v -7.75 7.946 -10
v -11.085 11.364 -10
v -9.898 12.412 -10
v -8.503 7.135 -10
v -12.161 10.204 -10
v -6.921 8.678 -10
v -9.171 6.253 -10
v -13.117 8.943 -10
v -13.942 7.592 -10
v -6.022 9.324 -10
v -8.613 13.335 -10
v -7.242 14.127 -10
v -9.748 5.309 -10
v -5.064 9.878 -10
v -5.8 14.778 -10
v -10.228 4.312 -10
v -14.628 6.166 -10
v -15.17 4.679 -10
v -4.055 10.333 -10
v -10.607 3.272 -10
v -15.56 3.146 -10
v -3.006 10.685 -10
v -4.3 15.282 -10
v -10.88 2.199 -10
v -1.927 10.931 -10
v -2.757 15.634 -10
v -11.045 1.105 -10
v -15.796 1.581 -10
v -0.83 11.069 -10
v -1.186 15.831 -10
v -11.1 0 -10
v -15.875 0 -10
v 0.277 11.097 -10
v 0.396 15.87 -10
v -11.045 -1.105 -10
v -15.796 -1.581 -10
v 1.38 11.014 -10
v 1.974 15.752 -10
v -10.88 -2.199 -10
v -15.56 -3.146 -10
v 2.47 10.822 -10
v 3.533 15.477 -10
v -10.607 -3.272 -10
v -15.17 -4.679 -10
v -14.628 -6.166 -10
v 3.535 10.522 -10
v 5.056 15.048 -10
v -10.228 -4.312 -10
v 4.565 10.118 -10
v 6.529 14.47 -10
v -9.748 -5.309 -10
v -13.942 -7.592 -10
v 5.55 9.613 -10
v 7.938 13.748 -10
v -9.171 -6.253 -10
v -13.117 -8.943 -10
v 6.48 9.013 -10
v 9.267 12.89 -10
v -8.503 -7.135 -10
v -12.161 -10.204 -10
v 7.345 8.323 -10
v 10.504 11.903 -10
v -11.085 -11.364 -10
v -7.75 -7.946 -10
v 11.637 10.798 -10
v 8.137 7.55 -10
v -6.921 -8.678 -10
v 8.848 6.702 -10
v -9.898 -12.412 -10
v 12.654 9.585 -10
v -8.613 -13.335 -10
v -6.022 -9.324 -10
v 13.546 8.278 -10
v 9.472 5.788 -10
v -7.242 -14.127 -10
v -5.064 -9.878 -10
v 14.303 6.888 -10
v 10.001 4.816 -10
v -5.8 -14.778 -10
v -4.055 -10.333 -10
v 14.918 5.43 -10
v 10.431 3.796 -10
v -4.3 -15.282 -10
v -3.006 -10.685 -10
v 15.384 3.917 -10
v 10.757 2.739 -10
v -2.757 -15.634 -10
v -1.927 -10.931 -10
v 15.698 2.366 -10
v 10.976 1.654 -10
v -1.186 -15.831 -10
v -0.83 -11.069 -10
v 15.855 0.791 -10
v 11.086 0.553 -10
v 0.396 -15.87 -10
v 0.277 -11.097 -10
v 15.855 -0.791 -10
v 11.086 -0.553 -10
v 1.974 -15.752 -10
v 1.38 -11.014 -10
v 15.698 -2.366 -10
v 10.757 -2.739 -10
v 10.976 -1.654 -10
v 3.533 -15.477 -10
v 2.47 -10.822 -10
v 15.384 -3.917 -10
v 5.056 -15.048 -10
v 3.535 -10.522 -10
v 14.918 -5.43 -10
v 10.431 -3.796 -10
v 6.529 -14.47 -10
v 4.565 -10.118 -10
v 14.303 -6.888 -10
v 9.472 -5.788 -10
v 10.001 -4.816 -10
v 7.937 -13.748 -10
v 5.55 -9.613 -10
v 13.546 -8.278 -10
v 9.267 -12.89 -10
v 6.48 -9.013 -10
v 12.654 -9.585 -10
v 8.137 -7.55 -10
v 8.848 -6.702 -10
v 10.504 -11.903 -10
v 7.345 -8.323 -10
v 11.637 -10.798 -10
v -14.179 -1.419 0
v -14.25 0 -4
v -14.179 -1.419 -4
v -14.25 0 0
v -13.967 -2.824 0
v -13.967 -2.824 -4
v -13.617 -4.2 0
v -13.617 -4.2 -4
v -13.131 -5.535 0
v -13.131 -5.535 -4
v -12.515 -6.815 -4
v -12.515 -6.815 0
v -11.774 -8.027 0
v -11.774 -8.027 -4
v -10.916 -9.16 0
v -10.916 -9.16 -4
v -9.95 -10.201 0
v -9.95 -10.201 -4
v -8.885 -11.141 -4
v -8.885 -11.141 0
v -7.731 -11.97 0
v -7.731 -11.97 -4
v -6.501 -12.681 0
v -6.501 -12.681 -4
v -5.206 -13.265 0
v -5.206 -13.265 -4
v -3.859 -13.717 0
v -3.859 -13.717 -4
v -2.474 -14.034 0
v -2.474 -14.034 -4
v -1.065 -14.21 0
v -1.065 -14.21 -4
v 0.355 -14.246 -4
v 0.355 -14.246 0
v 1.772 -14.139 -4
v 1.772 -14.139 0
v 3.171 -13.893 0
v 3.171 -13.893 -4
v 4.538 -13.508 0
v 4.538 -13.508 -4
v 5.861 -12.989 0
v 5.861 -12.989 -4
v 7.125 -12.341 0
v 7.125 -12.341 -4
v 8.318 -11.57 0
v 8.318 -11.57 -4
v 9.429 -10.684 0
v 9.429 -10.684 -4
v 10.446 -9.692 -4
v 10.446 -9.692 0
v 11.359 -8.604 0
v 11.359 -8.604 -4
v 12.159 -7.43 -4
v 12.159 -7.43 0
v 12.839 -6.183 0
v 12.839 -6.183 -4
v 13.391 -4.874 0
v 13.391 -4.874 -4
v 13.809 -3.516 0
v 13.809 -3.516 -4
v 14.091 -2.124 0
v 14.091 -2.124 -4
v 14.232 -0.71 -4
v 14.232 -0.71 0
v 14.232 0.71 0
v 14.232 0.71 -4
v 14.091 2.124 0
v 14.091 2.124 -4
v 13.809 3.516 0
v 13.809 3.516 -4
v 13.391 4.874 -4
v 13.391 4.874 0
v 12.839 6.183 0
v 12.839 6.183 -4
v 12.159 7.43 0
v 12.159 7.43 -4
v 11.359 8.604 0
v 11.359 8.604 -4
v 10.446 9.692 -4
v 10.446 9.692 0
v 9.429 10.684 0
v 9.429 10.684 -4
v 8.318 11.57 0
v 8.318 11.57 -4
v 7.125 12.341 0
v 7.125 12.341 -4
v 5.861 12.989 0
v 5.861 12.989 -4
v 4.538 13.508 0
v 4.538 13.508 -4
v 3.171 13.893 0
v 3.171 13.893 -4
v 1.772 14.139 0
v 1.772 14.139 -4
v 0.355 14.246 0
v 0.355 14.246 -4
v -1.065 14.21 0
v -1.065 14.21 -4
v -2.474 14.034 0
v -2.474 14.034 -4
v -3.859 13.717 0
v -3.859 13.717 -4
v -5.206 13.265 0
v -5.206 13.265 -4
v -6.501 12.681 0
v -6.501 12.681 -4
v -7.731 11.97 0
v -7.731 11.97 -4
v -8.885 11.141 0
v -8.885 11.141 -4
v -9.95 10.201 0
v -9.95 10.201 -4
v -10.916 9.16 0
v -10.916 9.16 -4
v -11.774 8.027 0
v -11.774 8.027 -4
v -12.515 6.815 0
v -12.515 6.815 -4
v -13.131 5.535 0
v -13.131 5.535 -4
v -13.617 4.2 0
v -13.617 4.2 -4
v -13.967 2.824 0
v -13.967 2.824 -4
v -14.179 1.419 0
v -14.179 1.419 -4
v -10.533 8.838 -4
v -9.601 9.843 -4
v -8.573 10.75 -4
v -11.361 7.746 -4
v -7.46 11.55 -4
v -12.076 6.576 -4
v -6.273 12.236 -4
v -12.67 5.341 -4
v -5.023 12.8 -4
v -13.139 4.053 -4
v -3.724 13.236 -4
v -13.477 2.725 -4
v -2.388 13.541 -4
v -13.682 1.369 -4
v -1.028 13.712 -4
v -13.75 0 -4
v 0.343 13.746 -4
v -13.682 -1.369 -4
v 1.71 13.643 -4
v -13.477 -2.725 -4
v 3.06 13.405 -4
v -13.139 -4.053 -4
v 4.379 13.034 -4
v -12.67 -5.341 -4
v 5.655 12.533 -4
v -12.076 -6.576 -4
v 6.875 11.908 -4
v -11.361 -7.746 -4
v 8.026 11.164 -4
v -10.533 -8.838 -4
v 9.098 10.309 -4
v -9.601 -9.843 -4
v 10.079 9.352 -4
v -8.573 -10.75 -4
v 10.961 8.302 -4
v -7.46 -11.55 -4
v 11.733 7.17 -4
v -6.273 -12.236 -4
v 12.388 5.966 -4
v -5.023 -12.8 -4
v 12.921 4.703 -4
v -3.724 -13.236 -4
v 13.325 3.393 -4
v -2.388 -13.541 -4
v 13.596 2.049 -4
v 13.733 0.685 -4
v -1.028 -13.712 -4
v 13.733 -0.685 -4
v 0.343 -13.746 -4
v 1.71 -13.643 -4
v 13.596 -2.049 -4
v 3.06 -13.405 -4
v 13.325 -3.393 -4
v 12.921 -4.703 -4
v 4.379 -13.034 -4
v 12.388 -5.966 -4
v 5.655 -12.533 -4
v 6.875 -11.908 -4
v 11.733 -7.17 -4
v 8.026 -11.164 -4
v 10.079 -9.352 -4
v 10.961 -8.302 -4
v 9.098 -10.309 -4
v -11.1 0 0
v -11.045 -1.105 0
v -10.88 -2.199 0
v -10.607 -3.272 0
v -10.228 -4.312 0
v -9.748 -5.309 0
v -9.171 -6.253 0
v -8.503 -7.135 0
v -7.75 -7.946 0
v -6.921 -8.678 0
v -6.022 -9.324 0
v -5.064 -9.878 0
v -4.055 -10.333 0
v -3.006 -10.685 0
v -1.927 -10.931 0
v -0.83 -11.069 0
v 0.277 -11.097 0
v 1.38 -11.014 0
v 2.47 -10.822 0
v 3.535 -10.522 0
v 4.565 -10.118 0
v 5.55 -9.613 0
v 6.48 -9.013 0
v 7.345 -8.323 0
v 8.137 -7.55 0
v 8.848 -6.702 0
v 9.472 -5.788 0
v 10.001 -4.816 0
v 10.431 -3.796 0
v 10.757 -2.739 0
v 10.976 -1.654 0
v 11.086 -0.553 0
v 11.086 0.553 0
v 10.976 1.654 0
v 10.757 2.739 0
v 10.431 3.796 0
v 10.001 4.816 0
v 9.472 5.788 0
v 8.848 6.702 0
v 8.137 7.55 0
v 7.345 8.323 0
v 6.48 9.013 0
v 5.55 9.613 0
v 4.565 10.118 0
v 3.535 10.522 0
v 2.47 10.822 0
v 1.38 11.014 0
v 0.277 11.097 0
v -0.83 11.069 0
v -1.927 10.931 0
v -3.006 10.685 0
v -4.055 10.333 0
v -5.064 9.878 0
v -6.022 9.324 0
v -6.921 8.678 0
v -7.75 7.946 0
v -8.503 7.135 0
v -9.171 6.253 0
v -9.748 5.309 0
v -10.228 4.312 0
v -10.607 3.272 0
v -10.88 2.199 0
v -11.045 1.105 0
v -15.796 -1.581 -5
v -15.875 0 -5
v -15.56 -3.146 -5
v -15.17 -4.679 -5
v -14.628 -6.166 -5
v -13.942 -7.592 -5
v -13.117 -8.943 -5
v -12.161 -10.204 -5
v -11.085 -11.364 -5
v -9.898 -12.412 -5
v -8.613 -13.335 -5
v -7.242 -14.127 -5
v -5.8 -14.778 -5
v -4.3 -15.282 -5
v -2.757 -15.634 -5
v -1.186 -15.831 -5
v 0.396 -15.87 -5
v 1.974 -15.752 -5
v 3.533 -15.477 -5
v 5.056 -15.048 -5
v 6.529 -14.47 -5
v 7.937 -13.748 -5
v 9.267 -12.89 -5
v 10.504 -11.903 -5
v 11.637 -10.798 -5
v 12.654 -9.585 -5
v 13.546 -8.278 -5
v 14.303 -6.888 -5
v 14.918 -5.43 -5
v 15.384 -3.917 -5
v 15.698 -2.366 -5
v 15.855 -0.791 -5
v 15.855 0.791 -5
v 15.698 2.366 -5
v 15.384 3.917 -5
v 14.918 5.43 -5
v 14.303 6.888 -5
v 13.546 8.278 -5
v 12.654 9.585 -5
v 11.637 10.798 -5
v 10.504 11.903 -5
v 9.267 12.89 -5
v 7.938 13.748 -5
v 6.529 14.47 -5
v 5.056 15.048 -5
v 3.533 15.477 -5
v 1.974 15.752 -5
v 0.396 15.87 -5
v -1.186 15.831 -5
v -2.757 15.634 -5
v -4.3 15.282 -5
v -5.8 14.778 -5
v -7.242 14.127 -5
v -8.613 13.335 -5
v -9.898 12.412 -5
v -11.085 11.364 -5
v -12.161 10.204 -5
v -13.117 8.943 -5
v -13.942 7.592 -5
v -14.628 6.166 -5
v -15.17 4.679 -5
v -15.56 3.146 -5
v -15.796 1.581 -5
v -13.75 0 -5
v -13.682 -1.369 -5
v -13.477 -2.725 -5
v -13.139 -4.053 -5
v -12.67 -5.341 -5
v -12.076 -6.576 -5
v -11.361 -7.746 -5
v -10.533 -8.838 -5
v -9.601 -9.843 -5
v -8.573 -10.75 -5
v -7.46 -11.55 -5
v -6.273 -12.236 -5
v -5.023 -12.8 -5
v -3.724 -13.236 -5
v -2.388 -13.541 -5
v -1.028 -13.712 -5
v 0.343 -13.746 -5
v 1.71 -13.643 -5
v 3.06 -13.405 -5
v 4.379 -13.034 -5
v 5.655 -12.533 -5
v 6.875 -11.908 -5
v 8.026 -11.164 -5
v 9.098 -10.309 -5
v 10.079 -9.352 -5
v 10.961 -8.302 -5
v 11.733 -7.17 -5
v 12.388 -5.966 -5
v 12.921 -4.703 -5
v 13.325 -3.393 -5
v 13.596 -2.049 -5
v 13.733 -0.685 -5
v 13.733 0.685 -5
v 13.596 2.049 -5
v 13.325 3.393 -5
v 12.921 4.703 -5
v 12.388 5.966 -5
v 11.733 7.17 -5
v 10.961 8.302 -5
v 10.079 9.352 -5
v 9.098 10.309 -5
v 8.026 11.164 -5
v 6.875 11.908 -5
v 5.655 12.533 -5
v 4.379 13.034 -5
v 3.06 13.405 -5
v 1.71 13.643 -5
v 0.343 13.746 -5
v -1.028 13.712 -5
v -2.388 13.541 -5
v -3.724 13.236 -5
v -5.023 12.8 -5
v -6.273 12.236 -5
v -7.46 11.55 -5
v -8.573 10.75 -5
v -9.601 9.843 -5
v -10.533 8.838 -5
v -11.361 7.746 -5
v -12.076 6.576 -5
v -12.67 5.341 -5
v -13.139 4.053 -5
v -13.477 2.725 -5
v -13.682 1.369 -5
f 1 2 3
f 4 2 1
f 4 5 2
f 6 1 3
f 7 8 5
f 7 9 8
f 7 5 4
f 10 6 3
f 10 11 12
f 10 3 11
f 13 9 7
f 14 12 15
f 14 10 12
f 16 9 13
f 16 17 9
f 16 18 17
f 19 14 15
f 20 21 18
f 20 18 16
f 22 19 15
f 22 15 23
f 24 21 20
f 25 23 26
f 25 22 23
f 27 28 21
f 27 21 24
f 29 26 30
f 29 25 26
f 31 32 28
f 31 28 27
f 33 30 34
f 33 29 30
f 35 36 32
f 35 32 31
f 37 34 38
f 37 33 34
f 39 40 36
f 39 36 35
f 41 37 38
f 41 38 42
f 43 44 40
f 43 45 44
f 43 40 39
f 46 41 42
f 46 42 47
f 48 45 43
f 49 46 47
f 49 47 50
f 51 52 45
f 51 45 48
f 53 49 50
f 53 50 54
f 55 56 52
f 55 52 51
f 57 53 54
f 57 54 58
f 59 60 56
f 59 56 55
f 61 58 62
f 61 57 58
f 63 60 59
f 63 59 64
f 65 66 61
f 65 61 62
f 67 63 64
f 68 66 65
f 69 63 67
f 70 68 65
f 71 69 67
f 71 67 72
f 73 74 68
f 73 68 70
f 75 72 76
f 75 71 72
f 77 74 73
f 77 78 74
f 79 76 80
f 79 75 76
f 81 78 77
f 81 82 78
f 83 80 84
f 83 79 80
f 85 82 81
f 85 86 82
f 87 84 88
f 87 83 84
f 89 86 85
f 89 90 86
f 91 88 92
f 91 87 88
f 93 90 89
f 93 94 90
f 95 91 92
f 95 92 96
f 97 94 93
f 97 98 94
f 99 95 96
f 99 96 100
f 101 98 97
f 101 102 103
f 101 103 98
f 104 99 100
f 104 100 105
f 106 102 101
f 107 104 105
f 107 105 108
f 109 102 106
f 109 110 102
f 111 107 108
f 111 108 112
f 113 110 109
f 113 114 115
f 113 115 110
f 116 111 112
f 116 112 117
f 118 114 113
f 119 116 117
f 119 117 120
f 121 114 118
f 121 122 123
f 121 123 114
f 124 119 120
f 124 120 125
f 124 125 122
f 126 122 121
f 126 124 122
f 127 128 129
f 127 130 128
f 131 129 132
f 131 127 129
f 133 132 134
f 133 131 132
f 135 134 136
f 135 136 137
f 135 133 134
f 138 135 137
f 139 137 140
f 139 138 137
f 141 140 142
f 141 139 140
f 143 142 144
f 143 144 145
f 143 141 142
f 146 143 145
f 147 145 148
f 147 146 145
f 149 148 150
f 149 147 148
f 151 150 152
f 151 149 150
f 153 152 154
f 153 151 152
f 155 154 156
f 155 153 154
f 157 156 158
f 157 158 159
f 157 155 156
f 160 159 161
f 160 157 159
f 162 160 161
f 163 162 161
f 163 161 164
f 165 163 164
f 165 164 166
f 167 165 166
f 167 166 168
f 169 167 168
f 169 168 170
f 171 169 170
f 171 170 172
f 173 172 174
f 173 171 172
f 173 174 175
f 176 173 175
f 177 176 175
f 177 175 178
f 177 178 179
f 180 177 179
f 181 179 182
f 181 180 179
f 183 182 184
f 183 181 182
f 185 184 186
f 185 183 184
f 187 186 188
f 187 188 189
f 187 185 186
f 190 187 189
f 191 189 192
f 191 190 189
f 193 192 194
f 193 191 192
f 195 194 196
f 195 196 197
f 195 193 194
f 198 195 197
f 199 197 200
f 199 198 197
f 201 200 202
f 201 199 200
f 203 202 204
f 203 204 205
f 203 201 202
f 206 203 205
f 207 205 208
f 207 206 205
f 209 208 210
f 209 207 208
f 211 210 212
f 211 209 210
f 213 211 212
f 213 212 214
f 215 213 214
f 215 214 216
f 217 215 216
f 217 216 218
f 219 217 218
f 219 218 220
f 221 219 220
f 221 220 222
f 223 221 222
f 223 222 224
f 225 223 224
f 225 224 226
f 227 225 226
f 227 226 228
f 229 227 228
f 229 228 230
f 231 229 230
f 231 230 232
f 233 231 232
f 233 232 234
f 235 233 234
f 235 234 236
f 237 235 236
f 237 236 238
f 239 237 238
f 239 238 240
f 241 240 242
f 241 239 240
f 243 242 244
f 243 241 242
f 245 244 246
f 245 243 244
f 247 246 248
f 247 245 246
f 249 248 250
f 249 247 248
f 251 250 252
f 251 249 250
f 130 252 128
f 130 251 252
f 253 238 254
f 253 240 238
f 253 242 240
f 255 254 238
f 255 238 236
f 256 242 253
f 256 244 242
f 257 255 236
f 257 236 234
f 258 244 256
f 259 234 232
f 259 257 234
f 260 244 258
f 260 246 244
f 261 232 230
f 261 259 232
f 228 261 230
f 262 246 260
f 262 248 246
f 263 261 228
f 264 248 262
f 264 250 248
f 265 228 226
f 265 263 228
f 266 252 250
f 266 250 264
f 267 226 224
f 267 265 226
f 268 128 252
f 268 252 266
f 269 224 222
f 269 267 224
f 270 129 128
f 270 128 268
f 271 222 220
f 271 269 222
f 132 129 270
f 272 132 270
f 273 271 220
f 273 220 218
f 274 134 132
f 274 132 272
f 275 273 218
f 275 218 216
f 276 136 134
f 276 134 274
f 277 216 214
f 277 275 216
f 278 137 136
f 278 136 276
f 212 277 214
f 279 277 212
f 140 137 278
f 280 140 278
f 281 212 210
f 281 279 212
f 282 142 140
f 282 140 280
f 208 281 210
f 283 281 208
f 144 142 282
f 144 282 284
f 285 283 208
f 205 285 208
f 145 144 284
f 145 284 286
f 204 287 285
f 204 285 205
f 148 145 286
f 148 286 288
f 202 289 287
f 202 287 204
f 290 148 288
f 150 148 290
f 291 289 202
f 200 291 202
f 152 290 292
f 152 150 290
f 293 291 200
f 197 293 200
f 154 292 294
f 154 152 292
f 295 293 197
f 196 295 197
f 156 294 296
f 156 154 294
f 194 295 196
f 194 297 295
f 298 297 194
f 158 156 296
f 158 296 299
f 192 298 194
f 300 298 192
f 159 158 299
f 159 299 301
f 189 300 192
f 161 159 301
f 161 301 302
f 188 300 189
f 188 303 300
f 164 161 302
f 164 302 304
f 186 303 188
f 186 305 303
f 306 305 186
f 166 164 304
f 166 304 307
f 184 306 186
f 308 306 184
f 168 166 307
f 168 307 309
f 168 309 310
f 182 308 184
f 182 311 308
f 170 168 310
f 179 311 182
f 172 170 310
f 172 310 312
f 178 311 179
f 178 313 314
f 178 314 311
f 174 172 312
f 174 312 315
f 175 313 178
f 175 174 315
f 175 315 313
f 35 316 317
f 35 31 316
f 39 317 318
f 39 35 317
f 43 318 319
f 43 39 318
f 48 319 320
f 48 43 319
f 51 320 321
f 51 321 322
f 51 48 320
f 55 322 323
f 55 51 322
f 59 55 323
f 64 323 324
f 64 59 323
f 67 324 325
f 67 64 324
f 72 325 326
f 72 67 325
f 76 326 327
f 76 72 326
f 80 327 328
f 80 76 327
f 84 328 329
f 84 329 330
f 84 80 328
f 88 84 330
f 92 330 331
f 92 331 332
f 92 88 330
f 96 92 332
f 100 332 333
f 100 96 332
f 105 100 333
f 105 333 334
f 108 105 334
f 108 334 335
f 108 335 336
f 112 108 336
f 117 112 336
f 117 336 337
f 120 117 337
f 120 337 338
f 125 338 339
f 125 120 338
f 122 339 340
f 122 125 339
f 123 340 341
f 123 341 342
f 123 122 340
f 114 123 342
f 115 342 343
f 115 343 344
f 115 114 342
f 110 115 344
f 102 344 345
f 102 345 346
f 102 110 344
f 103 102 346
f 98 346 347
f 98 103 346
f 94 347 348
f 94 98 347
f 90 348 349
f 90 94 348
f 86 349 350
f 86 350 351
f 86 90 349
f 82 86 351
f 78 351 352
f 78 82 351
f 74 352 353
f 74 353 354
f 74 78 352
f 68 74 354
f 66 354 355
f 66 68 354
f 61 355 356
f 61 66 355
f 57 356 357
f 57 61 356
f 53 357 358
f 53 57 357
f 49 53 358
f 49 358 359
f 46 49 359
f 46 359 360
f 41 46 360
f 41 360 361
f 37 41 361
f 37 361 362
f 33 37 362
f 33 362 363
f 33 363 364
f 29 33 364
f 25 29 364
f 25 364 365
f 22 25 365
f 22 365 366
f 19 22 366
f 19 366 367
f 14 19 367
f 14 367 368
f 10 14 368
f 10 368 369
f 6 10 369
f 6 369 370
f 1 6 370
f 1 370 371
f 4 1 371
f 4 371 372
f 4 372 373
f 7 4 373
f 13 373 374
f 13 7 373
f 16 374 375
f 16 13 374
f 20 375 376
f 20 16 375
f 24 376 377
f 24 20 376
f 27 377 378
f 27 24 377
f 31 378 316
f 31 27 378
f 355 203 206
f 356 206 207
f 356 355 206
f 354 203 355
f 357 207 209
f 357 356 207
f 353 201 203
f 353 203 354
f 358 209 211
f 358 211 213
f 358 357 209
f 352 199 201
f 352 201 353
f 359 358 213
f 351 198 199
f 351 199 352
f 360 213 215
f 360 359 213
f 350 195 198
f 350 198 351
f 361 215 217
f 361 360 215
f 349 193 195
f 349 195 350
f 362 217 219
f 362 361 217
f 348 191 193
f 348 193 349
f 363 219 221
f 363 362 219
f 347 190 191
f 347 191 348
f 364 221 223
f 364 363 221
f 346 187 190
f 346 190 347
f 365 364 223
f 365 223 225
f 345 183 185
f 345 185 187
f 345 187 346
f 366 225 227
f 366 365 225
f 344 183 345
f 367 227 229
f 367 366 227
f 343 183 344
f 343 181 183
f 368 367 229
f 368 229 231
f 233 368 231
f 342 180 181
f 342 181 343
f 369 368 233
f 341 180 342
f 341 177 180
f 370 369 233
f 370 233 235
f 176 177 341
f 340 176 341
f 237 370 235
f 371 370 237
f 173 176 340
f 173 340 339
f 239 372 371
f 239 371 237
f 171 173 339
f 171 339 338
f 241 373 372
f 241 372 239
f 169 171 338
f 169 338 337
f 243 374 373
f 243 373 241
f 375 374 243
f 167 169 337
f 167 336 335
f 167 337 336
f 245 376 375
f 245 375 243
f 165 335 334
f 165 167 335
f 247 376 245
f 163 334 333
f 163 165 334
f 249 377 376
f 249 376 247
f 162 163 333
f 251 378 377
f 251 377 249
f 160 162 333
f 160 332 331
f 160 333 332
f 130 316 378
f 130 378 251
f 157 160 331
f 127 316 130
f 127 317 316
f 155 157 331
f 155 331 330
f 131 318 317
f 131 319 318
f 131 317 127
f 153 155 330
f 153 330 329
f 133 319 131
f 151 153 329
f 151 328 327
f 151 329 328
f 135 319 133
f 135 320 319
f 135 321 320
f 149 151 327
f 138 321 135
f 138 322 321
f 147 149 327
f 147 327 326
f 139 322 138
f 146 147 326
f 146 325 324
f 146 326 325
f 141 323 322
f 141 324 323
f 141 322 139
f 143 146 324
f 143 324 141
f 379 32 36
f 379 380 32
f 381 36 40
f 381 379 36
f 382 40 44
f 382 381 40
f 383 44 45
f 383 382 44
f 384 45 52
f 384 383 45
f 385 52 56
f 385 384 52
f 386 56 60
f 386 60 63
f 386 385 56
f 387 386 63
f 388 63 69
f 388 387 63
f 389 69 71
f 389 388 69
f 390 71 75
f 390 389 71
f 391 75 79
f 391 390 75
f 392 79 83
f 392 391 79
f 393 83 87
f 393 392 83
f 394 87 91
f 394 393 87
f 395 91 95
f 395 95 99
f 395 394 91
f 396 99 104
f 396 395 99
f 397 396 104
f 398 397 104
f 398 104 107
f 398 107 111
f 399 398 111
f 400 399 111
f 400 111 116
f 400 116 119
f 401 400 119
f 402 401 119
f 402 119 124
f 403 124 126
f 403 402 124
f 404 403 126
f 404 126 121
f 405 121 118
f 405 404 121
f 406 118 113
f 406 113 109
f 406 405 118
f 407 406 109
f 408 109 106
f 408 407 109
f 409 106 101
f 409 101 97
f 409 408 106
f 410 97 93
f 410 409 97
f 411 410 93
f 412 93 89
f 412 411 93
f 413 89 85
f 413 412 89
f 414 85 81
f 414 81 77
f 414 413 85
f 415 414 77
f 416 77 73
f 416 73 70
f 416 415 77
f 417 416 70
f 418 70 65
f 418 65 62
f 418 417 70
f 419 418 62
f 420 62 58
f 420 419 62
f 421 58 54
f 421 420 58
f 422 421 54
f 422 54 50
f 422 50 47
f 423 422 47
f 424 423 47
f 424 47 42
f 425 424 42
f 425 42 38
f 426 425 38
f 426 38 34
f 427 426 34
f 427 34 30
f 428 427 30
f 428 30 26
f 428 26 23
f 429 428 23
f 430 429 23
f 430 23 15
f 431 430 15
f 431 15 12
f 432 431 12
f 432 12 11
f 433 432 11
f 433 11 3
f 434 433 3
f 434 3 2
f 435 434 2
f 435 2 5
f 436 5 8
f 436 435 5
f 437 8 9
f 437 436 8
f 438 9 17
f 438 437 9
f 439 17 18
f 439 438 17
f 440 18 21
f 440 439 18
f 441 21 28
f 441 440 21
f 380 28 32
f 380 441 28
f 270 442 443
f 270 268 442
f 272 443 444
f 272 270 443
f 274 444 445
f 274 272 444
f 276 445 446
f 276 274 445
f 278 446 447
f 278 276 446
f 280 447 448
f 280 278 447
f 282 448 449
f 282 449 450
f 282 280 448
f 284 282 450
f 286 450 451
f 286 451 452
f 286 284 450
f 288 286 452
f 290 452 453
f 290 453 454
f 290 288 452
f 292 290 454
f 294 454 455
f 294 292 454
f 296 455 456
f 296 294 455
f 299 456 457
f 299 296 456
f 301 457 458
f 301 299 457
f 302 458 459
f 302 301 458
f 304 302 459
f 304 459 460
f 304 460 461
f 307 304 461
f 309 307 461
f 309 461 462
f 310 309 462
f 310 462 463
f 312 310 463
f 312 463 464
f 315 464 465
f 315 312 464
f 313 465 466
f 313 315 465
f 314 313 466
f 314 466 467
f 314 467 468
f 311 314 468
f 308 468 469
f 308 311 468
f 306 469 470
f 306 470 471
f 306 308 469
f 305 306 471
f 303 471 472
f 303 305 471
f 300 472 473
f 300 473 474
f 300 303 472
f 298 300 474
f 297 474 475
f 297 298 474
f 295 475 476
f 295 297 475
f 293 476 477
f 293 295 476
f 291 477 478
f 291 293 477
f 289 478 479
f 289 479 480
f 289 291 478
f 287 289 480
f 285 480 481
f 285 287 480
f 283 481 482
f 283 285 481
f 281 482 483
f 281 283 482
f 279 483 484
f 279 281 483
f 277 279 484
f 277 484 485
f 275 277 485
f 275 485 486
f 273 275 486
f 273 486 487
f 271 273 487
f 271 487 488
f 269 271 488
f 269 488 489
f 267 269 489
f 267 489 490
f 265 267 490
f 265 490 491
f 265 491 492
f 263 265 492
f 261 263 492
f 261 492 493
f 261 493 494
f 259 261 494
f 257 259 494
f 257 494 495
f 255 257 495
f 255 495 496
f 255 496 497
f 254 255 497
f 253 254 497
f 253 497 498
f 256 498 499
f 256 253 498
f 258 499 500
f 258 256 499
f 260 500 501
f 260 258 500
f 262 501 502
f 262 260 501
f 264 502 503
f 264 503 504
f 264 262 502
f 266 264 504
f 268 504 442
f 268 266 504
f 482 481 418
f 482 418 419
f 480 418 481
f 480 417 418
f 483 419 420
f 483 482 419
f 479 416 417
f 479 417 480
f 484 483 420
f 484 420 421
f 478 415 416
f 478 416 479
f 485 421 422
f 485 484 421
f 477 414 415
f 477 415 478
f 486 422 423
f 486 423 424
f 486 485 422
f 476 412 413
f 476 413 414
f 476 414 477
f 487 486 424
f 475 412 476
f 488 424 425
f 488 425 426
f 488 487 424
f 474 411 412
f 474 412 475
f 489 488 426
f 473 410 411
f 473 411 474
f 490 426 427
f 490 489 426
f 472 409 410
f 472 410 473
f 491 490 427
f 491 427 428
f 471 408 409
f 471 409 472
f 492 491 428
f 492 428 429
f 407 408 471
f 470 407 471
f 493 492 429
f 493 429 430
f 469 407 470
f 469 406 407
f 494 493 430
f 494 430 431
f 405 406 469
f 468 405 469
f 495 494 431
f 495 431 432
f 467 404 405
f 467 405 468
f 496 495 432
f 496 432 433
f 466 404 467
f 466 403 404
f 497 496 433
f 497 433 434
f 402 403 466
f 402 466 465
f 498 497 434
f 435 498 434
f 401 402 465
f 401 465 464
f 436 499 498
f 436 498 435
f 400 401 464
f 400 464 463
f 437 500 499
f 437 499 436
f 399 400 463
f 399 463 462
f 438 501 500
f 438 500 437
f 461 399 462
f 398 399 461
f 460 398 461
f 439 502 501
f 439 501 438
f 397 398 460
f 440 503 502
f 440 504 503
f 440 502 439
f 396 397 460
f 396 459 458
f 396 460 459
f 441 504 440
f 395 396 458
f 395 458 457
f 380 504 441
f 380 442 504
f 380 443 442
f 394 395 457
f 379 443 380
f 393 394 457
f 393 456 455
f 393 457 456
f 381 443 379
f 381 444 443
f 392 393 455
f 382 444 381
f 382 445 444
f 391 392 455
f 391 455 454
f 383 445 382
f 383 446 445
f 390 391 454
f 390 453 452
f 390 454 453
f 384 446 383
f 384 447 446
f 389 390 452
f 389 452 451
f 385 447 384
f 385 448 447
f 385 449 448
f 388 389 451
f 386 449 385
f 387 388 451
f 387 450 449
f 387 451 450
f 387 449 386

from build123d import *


with BuildPart() as part:
    # 草图1 → 旋转1 (revolve)
    with BuildSketch(Plane(origin=(0, 0, 0), x_dir=(1, 0, 0), z_dir=(0, 1, 0)), mode=Mode.PRIVATE) as revolve_1_sk:
        Polygon((11.1, 0), (11.1, 10), (15.875, 10), (15.875, 5), (13.75, 5), (13.75, 4), (14.25, 4), (14.25, 0), align=None)
    revolve(revolve_1_sk.sketch.rotate(Axis((0, 0, -19.14057971), (0, 0, 1)), 180), axis=Axis((0, 0, -19.14057971), (0, 0, 1)))  # turned: the seam where the file's is


solid = part.part
